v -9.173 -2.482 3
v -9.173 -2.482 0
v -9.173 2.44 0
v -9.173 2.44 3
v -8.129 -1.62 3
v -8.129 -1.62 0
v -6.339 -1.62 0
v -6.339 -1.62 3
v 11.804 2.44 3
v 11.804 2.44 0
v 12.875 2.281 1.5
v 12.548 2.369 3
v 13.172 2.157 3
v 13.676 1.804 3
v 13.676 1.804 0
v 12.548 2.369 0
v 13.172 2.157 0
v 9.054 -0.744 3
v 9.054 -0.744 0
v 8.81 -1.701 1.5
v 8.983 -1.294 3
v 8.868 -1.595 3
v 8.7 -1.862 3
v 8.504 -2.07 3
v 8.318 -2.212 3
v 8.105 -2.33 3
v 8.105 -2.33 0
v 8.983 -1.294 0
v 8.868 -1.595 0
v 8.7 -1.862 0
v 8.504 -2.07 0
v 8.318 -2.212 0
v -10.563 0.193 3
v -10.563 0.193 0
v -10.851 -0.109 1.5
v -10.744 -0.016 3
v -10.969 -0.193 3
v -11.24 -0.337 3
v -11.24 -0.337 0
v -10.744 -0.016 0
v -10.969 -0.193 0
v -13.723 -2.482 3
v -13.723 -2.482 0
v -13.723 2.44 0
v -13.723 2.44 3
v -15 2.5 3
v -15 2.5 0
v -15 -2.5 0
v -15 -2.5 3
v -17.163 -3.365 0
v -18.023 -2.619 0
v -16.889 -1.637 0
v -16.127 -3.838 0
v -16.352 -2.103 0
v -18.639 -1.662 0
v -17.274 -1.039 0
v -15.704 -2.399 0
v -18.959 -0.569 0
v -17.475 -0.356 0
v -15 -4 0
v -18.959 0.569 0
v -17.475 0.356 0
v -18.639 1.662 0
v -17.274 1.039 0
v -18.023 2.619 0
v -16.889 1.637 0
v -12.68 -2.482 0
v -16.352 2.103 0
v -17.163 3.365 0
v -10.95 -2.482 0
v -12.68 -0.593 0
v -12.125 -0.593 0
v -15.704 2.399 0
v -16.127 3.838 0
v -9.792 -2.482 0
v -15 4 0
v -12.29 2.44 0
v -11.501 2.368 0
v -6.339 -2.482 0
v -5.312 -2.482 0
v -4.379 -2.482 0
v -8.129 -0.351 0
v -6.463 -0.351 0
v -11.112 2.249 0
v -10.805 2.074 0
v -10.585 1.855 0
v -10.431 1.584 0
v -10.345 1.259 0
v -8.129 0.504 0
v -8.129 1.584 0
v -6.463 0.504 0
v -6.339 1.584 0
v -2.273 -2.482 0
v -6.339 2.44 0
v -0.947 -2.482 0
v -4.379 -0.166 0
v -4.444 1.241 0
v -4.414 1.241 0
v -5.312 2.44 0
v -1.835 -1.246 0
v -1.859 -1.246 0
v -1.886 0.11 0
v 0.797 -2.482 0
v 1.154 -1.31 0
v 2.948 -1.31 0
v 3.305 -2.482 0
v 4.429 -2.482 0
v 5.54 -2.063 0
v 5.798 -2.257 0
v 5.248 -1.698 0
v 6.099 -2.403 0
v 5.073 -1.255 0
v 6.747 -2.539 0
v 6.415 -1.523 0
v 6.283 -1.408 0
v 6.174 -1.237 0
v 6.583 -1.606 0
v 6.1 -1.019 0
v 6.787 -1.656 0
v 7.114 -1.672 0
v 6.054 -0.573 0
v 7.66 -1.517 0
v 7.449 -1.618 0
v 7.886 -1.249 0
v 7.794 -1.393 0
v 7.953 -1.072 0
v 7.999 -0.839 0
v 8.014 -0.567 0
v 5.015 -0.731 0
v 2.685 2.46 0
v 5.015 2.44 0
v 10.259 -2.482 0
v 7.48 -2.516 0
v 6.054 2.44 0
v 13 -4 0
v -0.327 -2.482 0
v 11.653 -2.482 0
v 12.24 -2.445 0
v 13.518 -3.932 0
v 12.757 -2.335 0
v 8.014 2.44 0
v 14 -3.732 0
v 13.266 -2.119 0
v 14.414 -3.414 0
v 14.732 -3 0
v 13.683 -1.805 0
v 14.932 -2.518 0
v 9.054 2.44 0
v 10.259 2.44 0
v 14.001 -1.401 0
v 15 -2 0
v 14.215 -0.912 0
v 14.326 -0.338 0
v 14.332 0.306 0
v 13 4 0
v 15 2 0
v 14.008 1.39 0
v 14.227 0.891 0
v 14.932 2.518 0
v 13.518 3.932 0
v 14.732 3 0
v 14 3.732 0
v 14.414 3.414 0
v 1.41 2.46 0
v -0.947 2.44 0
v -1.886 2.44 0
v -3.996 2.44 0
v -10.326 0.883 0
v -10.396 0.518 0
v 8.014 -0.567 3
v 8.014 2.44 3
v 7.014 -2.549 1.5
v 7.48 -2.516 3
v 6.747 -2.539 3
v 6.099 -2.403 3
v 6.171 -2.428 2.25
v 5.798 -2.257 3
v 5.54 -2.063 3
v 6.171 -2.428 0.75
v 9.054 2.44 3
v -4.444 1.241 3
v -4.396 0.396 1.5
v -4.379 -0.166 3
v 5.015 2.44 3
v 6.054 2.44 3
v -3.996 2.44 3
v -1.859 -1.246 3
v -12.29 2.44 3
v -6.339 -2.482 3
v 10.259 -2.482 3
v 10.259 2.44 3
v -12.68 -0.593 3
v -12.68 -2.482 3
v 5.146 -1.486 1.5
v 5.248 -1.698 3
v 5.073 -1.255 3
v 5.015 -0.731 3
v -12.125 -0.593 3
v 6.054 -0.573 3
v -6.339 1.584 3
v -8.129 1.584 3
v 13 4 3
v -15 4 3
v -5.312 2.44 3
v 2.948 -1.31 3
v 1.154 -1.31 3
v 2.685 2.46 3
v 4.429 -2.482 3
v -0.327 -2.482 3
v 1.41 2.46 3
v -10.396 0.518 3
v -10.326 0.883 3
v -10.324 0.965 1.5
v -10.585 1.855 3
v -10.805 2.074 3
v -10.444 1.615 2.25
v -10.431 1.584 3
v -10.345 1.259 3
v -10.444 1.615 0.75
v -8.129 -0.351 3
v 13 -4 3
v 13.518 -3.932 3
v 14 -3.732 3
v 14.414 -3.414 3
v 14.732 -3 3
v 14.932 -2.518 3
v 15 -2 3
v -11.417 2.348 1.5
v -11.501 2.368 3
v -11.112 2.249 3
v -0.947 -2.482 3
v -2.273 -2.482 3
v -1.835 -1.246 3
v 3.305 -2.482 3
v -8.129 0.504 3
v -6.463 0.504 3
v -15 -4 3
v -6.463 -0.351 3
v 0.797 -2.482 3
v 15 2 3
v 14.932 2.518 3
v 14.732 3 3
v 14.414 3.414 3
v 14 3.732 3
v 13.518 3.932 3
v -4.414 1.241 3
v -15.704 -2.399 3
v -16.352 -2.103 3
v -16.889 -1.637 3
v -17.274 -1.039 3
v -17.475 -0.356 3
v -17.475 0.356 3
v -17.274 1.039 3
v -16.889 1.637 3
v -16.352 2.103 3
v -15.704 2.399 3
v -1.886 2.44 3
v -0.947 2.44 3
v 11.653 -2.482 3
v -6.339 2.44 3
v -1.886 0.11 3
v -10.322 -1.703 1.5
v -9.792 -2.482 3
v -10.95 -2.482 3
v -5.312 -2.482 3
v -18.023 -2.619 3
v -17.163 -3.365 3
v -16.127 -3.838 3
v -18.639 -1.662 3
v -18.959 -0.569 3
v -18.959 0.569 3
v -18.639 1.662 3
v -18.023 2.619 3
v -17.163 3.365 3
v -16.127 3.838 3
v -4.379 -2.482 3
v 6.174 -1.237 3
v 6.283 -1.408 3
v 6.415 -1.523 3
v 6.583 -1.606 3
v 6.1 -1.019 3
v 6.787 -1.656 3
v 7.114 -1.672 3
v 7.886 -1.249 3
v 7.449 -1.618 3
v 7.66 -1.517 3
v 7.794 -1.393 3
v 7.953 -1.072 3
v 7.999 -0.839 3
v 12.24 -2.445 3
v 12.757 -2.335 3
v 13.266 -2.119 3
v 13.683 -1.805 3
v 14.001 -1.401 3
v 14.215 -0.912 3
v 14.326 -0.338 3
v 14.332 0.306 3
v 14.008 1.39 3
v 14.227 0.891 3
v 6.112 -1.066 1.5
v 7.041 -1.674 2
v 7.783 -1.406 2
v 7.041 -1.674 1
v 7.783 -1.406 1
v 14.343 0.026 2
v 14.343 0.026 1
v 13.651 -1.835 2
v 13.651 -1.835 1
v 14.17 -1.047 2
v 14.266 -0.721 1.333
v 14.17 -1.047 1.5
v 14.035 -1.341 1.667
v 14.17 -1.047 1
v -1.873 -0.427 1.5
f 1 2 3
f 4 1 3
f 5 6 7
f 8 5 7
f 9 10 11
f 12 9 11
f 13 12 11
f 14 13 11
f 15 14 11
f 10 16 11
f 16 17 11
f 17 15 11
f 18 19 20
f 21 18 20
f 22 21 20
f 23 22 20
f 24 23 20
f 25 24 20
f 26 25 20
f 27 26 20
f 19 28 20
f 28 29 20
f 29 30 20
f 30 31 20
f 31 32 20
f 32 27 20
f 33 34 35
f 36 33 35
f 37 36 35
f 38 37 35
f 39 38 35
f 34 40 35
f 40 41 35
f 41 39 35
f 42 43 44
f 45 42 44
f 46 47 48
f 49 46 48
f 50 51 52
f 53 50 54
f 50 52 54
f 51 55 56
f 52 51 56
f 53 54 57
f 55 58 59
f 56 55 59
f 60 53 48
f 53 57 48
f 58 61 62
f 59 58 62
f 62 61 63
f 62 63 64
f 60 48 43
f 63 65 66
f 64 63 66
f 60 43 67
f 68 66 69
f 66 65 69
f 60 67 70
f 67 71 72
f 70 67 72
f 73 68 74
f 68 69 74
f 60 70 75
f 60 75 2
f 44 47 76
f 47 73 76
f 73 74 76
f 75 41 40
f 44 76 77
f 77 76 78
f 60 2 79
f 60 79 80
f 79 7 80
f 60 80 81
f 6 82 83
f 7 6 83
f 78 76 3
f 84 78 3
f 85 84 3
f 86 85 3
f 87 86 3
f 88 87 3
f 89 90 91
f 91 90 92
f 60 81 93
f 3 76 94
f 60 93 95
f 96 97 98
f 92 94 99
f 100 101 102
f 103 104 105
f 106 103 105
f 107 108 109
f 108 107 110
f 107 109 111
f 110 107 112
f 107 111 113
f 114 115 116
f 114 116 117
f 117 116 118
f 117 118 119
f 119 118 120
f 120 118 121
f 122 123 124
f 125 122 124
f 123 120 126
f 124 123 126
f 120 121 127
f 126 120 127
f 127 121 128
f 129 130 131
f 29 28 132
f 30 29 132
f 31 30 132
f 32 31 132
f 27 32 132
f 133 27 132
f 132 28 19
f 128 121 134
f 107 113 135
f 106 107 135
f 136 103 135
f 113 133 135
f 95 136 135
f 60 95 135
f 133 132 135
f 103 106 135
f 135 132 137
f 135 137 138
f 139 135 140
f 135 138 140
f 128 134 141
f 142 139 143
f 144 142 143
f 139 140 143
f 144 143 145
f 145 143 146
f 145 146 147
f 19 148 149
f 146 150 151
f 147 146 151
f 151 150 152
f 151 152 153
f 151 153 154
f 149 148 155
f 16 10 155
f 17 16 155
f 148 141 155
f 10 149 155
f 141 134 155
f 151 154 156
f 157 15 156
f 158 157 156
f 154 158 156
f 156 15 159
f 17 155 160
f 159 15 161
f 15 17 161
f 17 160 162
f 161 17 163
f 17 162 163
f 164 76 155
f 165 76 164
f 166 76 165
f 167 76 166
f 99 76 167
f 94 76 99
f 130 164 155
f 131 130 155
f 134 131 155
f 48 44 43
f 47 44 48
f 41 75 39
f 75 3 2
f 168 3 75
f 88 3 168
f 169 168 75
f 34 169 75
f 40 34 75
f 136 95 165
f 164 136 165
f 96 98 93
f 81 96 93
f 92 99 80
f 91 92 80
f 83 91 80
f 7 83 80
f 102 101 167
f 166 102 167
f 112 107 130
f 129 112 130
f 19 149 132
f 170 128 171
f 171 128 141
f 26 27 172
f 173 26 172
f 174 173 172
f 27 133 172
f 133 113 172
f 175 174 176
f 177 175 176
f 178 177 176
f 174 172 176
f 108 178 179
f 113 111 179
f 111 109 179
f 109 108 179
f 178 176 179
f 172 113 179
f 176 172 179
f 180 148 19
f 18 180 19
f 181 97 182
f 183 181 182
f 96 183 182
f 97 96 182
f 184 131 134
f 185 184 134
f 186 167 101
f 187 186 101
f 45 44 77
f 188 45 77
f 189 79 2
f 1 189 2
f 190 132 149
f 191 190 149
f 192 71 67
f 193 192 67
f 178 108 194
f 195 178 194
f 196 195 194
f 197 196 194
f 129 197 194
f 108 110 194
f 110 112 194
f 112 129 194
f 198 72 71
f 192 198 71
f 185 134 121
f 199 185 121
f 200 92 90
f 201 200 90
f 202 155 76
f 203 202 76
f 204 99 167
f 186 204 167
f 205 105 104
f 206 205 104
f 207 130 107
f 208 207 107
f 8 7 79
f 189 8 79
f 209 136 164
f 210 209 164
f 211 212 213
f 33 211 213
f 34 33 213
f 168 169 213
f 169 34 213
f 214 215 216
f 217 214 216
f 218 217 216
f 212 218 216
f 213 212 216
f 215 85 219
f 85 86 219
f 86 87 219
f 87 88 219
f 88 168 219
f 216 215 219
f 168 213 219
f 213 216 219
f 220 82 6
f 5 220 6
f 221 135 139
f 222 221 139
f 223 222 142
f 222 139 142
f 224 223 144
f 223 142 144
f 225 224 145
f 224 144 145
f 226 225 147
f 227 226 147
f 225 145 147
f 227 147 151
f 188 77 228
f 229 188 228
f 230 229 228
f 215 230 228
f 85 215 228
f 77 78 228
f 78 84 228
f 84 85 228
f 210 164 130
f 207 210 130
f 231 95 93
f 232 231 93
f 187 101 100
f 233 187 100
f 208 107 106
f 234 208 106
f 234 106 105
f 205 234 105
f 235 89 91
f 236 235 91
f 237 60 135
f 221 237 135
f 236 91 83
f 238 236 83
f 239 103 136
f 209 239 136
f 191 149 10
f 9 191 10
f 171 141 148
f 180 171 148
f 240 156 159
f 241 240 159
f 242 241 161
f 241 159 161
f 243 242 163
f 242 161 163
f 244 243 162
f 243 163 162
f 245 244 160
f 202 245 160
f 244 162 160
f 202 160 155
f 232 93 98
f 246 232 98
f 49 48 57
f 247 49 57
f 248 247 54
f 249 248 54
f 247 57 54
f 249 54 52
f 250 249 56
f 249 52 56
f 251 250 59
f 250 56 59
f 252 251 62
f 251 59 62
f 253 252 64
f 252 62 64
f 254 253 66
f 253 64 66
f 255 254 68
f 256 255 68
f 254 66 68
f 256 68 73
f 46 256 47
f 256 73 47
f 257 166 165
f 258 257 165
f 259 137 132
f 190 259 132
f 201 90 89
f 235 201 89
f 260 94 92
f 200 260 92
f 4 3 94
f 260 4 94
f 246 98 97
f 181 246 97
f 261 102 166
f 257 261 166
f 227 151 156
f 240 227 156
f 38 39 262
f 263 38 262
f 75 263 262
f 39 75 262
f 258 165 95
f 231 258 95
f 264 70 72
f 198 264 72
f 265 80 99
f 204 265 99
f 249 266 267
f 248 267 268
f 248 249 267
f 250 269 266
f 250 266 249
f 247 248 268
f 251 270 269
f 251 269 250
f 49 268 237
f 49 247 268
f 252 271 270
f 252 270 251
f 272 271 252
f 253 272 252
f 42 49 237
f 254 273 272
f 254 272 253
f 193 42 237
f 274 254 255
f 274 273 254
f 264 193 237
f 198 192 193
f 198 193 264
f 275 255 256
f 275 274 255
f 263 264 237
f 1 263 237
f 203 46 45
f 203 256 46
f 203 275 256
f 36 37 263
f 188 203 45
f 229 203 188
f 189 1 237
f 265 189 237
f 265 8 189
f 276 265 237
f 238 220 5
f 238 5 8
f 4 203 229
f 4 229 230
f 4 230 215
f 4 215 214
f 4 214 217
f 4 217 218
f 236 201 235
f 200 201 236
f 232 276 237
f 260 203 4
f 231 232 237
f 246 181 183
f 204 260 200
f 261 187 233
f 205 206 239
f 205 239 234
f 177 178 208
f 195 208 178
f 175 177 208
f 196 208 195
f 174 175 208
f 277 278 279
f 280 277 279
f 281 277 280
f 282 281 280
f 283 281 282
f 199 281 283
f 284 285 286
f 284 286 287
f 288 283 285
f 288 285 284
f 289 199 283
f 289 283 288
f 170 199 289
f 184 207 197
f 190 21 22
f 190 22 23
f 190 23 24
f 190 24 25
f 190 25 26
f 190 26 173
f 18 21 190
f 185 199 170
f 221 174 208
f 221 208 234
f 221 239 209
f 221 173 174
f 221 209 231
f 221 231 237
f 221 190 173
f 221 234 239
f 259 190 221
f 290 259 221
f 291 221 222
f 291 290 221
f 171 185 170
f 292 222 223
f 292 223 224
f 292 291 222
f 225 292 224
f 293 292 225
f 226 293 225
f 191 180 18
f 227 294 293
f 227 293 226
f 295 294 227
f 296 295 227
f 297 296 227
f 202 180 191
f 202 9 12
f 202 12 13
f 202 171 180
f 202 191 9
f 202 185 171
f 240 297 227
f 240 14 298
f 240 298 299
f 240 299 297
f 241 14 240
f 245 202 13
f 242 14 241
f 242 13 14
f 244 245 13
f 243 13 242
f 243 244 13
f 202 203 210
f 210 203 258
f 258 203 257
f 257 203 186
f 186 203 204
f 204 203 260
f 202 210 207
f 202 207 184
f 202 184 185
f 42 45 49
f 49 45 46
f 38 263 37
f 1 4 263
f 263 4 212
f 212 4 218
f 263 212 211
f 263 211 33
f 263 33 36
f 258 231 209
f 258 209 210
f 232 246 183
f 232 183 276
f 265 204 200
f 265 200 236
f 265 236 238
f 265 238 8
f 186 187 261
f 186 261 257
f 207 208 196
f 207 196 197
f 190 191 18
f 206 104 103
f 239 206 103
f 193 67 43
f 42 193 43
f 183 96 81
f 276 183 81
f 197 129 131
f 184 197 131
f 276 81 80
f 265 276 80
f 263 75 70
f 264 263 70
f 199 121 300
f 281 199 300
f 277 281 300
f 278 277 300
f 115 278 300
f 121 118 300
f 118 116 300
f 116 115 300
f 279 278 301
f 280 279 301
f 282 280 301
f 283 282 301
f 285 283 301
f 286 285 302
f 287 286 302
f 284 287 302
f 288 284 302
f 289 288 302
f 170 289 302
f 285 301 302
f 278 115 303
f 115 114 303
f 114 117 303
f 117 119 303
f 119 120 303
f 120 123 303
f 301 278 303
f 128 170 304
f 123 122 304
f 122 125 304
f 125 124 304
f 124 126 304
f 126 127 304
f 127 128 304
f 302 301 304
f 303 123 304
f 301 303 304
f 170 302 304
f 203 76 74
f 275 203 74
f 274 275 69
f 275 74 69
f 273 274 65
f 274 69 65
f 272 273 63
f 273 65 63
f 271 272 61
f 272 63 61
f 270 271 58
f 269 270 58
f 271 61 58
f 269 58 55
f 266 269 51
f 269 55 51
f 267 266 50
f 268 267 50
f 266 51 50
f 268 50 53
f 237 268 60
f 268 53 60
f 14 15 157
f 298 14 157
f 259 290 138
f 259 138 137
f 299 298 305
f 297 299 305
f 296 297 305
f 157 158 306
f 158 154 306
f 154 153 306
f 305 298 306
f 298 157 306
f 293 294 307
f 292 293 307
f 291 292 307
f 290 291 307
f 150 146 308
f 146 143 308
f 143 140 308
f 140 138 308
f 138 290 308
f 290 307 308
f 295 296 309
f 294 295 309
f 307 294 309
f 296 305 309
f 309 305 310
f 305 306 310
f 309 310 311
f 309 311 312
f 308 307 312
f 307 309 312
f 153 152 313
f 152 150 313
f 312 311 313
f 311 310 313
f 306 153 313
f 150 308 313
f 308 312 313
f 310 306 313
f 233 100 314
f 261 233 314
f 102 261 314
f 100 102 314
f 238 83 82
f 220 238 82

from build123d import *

# Parameters (mm, degrees)
F1_DEPTH = 3


# Not quite as in the source:
# - a feature names something its author has since deleted; it is built from what else it names


with BuildPart() as f1:
    # F0 (on Top) → F1 (new body)
    with BuildSketch(Plane.XY):
        with BuildLine():
            Line((-15, 2.5), (-15, 4))
            ThreePointArc((-15, 4), (-19, 0), (-15, -4))
            Line((-15, -4), (-15, -2.5))
            ThreePointArc((-15, -2.5), (-17.5, 0), (-15, 2.5))
        make_face()
        with BuildLine():
            Line((13, 4), (-15, 4))
            Line((-15, 4), (-15, 2.5))
            Line((-15, 2.5), (-15, -2.5))
            Line((-15, -2.5), (-15, -4))
            Line((-15, -4), (13, -4))
            ThreePointArc((13, -4), (14.4142135624, -3.4142135624), (15, -2))
            Line((15, -2), (15, 2))
            ThreePointArc((15, 2), (14.4142135624, 3.4142135624), (13, 4))
        make_face()
        with BuildLine():
            Line((-12.1249144637, -0.5934820884), (-12.6796209529, -0.5934820884))
            Line((-12.6796209529, -0.5934820884), (-12.6796209529, -2.4816383516))
            Line((-12.6796209529, -2.4816383516), (-13.7233308326, -2.4816383516))
            Line((-13.7233308326, -2.4816383516), (-13.7233308326, 2.4396314525))
            Line((-13.7233308326, 2.4396314525), (-12.2897107605, 2.4396314525))
            add(Edge.make_bspline(
                [(-12.2897107605, 2.4396314525), (-11.2858535801, 2.4396314525), (-10.8049284394, 2.0744945596)],
                knots=[0, 0, 0, 1, 1, 1], degree=2))
            add(Edge.make_bspline(
                [(-10.8049284394, 2.0744945596), (-10.3240032988, 1.7093576667), (-10.3240032988, 0.9650815812)],
                knots=[0, 0, 0, 1, 1, 1], degree=2))
            add(Edge.make_bspline(
                [(-10.3240032988, 0.9650815812), (-10.3240032988, 0.5310102897), (-10.5625809441, 0.1928008962)],
                knots=[0, 0, 0, 1, 1, 1], degree=2))
            add(Edge.make_bspline(
                [(-10.5625809441, 0.1928008962), (-10.8011585895, -0.1454084972), (-11.239538281, -0.3371322934)],
                knots=[0, 0, 0, 1, 1, 1], degree=2))
            add(Edge.make_bspline(
                [(-11.239538281, -0.3371322934), (-10.1279711026, -1.9969433611), (-9.7919159092, -2.4816383516)],
                knots=[0, 0, 0, 1, 1, 1], degree=2))
            Line((-9.7919159092, -2.4816383516), (-10.9497983866, -2.4816383516))
            Line((-10.9497983866, -2.4816383516), (-12.1249144637, -0.5934820884))
        make_face(mode=Mode.SUBTRACT)
        Polygon((-6.3387333765, -1.6199583684), (-6.3387333765, -2.4816383516), (-9.1725834212, -2.4816383516), (-9.1725834212, 2.4396314525), (-6.3387333765, 2.4396314525), (-6.3387333765, 1.5844140691), (-8.1288735416, 1.5844140691), (-8.1288735416, 0.5040827902), (-6.4625998741, 0.5040827902), (-6.4625998741, -0.3511345932), (-8.1288735416, -0.3511345932), (-8.1288735416, -1.6199583684), align=None, mode=Mode.SUBTRACT)
        with BuildLine():
            Line((-0.9467708815, 2.4396314525), (-0.9467708815, -2.4816383516))
            Line((-0.9467708815, -2.4816383516), (-2.2726809557, -2.4816383516))
            Line((-2.2726809557, -2.4816383516), (-4.413955714, 1.2408191758))
            Line((-4.413955714, 1.2408191758), (-4.4441145134, 1.2408191758))
            add(Edge.make_bspline(
                [(-4.4441145134, 1.2408191758), (-4.3794885146, 0.255272695), (-4.3794885146, -0.1658733968)],
                knots=[0, 0, 0, 1, 1, 1], degree=2))
            Line((-4.3794885146, -0.1658733968), (-4.3794885146, -2.4816383516))
            Line((-4.3794885146, -2.4816383516), (-5.3122570965, -2.4816383516))
            Line((-5.3122570965, -2.4816383516), (-5.3122570965, 2.4396314525))
            Line((-5.3122570965, 2.4396314525), (-3.9960409221, 2.4396314525))
            Line((-3.9960409221, 2.4396314525), (-1.8590745638, -1.2462046757))
            Line((-1.8590745638, -1.2462046757), (-1.8353783642, -1.2462046757))
            add(Edge.make_bspline(
                [(-1.8353783642, -1.2462046757), (-1.8860020632, -0.2865085944), (-1.8860020632, 0.1098641979)],
                knots=[0, 0, 0, 1, 1, 1], degree=2))
            Line((-1.8860020632, 0.1098641979), (-1.8860020632, 2.4396314525))
            Line((-1.8860020632, 2.4396314525), (-0.9467708815, 2.4396314525))
        make_face(mode=Mode.SUBTRACT)
        Polygon((4.4290351137, -2.4816383516), (3.3045427356, -2.4816383516), (2.9480226425, -1.3097535745), (1.1535740775, -1.3097535745), (0.7970539845, -2.4816383516), (-0.3274383936, -2.4816383516), (1.4099238725, 2.4600963521), (2.6852102477, 2.4600963521), align=None, mode=Mode.SUBTRACT)
        with BuildLine():
            Line((8.0136238438, 2.4396314525), (9.0541024235, 2.4396314525))
            Line((9.0541024235, 2.4396314525), (9.0541024235, -0.7442760855))
            add(Edge.make_bspline(
                [(9.0541024235, -0.7442760855), (9.0541024235, -1.2903657749), (8.8101392783, -1.7007408669)],
                knots=[0, 0, 0, 1, 1, 1], degree=2))
            add(Edge.make_bspline(
                [(8.8101392783, -1.7007408669), (8.5661761331, -2.1111159589), (8.1046387921, -2.3303058046)],
                knots=[0, 0, 0, 1, 1, 1], degree=2))
            add(Edge.make_bspline(
                [(8.1046387921, -2.3303058046), (7.643101451, -2.5494956503), (7.0140750633, -2.5494956503)],
                knots=[0, 0, 0, 1, 1, 1], degree=2))
            add(Edge.make_bspline(
                [(7.0140750633, -2.5494956503), (6.0651499818, -2.5494956503), (5.540063742, -2.0626464598)],
                knots=[0, 0, 0, 1, 1, 1], degree=2))
            add(Edge.make_bspline(
                [(5.540063742, -2.0626464598), (5.0149775023, -1.5757972693), (5.0149775023, -0.7313508857)],
                knots=[0, 0, 0, 1, 1, 1], degree=2))
            Line((5.0149775023, -0.7313508857), (5.0149775023, 2.4396314525))
            Line((5.0149775023, 2.4396314525), (6.054378982, 2.4396314525))
            Line((6.054378982, 2.4396314525), (6.054378982, -0.5730171888))
            add(Edge.make_bspline(
                [(6.054378982, -0.5730171888), (6.054378982, -1.1417259777), (6.2832627275, -1.4077696726)],
                knots=[0, 0, 0, 1, 1, 1], degree=2))
            add(Edge.make_bspline(
                [(6.2832627275, -1.4077696726), (6.5121464731, -1.6738133674), (7.0410025628, -1.6738133674)],
                knots=[0, 0, 0, 1, 1, 1], degree=2))
            add(Edge.make_bspline(
                [(7.0410025628, -1.6738133674), (7.5526250528, -1.6738133674), (7.7831244483, -1.4061540226)],
                knots=[0, 0, 0, 1, 1, 1], degree=2))
            add(Edge.make_bspline(
                [(7.7831244483, -1.4061540226), (8.0136238438, -1.1384946778), (8.0136238438, -0.566554589)],
                knots=[0, 0, 0, 1, 1, 1], degree=2))
            Line((8.0136238438, -0.566554589), (8.0136238438, 2.4396314525))
        make_face(mode=Mode.SUBTRACT)
        with BuildLine():
            add(Edge.make_bspline(
                [(13.6759384335, 1.8036039149), (14.3426633205, 1.1675763772), (14.3426633205, 0.0258503995)],
                knots=[0, 0, 0, 1, 1, 1], degree=2))
            add(Edge.make_bspline(
                [(14.3426633205, 0.0258503995), (14.3426633205, -1.1891183768), (13.650626584, -1.8353783642)],
                knots=[0, 0, 0, 1, 1, 1], degree=2))
            add(Edge.make_bspline(
                [(13.650626584, -1.8353783642), (12.9585898475, -2.4816383516), (11.6531446729, -2.4816383516)],
                knots=[0, 0, 0, 1, 1, 1], degree=2))
            Line((11.6531446729, -2.4816383516), (10.2593773001, -2.4816383516))
            Line((10.2593773001, -2.4816383516), (10.2593773001, 2.4396314525))
            Line((10.2593773001, 2.4396314525), (11.80393867, 2.4396314525))
            add(Edge.make_bspline(
                [(11.80393867, 2.4396314525), (13.0092135465, 2.4396314525), (13.6759384335, 1.8036039149)],
                knots=[0, 0, 0, 1, 1, 1], degree=2))
        make_face(mode=Mode.SUBTRACT)
    extrude(amount=F1_DEPTH)


solid = f1.part
